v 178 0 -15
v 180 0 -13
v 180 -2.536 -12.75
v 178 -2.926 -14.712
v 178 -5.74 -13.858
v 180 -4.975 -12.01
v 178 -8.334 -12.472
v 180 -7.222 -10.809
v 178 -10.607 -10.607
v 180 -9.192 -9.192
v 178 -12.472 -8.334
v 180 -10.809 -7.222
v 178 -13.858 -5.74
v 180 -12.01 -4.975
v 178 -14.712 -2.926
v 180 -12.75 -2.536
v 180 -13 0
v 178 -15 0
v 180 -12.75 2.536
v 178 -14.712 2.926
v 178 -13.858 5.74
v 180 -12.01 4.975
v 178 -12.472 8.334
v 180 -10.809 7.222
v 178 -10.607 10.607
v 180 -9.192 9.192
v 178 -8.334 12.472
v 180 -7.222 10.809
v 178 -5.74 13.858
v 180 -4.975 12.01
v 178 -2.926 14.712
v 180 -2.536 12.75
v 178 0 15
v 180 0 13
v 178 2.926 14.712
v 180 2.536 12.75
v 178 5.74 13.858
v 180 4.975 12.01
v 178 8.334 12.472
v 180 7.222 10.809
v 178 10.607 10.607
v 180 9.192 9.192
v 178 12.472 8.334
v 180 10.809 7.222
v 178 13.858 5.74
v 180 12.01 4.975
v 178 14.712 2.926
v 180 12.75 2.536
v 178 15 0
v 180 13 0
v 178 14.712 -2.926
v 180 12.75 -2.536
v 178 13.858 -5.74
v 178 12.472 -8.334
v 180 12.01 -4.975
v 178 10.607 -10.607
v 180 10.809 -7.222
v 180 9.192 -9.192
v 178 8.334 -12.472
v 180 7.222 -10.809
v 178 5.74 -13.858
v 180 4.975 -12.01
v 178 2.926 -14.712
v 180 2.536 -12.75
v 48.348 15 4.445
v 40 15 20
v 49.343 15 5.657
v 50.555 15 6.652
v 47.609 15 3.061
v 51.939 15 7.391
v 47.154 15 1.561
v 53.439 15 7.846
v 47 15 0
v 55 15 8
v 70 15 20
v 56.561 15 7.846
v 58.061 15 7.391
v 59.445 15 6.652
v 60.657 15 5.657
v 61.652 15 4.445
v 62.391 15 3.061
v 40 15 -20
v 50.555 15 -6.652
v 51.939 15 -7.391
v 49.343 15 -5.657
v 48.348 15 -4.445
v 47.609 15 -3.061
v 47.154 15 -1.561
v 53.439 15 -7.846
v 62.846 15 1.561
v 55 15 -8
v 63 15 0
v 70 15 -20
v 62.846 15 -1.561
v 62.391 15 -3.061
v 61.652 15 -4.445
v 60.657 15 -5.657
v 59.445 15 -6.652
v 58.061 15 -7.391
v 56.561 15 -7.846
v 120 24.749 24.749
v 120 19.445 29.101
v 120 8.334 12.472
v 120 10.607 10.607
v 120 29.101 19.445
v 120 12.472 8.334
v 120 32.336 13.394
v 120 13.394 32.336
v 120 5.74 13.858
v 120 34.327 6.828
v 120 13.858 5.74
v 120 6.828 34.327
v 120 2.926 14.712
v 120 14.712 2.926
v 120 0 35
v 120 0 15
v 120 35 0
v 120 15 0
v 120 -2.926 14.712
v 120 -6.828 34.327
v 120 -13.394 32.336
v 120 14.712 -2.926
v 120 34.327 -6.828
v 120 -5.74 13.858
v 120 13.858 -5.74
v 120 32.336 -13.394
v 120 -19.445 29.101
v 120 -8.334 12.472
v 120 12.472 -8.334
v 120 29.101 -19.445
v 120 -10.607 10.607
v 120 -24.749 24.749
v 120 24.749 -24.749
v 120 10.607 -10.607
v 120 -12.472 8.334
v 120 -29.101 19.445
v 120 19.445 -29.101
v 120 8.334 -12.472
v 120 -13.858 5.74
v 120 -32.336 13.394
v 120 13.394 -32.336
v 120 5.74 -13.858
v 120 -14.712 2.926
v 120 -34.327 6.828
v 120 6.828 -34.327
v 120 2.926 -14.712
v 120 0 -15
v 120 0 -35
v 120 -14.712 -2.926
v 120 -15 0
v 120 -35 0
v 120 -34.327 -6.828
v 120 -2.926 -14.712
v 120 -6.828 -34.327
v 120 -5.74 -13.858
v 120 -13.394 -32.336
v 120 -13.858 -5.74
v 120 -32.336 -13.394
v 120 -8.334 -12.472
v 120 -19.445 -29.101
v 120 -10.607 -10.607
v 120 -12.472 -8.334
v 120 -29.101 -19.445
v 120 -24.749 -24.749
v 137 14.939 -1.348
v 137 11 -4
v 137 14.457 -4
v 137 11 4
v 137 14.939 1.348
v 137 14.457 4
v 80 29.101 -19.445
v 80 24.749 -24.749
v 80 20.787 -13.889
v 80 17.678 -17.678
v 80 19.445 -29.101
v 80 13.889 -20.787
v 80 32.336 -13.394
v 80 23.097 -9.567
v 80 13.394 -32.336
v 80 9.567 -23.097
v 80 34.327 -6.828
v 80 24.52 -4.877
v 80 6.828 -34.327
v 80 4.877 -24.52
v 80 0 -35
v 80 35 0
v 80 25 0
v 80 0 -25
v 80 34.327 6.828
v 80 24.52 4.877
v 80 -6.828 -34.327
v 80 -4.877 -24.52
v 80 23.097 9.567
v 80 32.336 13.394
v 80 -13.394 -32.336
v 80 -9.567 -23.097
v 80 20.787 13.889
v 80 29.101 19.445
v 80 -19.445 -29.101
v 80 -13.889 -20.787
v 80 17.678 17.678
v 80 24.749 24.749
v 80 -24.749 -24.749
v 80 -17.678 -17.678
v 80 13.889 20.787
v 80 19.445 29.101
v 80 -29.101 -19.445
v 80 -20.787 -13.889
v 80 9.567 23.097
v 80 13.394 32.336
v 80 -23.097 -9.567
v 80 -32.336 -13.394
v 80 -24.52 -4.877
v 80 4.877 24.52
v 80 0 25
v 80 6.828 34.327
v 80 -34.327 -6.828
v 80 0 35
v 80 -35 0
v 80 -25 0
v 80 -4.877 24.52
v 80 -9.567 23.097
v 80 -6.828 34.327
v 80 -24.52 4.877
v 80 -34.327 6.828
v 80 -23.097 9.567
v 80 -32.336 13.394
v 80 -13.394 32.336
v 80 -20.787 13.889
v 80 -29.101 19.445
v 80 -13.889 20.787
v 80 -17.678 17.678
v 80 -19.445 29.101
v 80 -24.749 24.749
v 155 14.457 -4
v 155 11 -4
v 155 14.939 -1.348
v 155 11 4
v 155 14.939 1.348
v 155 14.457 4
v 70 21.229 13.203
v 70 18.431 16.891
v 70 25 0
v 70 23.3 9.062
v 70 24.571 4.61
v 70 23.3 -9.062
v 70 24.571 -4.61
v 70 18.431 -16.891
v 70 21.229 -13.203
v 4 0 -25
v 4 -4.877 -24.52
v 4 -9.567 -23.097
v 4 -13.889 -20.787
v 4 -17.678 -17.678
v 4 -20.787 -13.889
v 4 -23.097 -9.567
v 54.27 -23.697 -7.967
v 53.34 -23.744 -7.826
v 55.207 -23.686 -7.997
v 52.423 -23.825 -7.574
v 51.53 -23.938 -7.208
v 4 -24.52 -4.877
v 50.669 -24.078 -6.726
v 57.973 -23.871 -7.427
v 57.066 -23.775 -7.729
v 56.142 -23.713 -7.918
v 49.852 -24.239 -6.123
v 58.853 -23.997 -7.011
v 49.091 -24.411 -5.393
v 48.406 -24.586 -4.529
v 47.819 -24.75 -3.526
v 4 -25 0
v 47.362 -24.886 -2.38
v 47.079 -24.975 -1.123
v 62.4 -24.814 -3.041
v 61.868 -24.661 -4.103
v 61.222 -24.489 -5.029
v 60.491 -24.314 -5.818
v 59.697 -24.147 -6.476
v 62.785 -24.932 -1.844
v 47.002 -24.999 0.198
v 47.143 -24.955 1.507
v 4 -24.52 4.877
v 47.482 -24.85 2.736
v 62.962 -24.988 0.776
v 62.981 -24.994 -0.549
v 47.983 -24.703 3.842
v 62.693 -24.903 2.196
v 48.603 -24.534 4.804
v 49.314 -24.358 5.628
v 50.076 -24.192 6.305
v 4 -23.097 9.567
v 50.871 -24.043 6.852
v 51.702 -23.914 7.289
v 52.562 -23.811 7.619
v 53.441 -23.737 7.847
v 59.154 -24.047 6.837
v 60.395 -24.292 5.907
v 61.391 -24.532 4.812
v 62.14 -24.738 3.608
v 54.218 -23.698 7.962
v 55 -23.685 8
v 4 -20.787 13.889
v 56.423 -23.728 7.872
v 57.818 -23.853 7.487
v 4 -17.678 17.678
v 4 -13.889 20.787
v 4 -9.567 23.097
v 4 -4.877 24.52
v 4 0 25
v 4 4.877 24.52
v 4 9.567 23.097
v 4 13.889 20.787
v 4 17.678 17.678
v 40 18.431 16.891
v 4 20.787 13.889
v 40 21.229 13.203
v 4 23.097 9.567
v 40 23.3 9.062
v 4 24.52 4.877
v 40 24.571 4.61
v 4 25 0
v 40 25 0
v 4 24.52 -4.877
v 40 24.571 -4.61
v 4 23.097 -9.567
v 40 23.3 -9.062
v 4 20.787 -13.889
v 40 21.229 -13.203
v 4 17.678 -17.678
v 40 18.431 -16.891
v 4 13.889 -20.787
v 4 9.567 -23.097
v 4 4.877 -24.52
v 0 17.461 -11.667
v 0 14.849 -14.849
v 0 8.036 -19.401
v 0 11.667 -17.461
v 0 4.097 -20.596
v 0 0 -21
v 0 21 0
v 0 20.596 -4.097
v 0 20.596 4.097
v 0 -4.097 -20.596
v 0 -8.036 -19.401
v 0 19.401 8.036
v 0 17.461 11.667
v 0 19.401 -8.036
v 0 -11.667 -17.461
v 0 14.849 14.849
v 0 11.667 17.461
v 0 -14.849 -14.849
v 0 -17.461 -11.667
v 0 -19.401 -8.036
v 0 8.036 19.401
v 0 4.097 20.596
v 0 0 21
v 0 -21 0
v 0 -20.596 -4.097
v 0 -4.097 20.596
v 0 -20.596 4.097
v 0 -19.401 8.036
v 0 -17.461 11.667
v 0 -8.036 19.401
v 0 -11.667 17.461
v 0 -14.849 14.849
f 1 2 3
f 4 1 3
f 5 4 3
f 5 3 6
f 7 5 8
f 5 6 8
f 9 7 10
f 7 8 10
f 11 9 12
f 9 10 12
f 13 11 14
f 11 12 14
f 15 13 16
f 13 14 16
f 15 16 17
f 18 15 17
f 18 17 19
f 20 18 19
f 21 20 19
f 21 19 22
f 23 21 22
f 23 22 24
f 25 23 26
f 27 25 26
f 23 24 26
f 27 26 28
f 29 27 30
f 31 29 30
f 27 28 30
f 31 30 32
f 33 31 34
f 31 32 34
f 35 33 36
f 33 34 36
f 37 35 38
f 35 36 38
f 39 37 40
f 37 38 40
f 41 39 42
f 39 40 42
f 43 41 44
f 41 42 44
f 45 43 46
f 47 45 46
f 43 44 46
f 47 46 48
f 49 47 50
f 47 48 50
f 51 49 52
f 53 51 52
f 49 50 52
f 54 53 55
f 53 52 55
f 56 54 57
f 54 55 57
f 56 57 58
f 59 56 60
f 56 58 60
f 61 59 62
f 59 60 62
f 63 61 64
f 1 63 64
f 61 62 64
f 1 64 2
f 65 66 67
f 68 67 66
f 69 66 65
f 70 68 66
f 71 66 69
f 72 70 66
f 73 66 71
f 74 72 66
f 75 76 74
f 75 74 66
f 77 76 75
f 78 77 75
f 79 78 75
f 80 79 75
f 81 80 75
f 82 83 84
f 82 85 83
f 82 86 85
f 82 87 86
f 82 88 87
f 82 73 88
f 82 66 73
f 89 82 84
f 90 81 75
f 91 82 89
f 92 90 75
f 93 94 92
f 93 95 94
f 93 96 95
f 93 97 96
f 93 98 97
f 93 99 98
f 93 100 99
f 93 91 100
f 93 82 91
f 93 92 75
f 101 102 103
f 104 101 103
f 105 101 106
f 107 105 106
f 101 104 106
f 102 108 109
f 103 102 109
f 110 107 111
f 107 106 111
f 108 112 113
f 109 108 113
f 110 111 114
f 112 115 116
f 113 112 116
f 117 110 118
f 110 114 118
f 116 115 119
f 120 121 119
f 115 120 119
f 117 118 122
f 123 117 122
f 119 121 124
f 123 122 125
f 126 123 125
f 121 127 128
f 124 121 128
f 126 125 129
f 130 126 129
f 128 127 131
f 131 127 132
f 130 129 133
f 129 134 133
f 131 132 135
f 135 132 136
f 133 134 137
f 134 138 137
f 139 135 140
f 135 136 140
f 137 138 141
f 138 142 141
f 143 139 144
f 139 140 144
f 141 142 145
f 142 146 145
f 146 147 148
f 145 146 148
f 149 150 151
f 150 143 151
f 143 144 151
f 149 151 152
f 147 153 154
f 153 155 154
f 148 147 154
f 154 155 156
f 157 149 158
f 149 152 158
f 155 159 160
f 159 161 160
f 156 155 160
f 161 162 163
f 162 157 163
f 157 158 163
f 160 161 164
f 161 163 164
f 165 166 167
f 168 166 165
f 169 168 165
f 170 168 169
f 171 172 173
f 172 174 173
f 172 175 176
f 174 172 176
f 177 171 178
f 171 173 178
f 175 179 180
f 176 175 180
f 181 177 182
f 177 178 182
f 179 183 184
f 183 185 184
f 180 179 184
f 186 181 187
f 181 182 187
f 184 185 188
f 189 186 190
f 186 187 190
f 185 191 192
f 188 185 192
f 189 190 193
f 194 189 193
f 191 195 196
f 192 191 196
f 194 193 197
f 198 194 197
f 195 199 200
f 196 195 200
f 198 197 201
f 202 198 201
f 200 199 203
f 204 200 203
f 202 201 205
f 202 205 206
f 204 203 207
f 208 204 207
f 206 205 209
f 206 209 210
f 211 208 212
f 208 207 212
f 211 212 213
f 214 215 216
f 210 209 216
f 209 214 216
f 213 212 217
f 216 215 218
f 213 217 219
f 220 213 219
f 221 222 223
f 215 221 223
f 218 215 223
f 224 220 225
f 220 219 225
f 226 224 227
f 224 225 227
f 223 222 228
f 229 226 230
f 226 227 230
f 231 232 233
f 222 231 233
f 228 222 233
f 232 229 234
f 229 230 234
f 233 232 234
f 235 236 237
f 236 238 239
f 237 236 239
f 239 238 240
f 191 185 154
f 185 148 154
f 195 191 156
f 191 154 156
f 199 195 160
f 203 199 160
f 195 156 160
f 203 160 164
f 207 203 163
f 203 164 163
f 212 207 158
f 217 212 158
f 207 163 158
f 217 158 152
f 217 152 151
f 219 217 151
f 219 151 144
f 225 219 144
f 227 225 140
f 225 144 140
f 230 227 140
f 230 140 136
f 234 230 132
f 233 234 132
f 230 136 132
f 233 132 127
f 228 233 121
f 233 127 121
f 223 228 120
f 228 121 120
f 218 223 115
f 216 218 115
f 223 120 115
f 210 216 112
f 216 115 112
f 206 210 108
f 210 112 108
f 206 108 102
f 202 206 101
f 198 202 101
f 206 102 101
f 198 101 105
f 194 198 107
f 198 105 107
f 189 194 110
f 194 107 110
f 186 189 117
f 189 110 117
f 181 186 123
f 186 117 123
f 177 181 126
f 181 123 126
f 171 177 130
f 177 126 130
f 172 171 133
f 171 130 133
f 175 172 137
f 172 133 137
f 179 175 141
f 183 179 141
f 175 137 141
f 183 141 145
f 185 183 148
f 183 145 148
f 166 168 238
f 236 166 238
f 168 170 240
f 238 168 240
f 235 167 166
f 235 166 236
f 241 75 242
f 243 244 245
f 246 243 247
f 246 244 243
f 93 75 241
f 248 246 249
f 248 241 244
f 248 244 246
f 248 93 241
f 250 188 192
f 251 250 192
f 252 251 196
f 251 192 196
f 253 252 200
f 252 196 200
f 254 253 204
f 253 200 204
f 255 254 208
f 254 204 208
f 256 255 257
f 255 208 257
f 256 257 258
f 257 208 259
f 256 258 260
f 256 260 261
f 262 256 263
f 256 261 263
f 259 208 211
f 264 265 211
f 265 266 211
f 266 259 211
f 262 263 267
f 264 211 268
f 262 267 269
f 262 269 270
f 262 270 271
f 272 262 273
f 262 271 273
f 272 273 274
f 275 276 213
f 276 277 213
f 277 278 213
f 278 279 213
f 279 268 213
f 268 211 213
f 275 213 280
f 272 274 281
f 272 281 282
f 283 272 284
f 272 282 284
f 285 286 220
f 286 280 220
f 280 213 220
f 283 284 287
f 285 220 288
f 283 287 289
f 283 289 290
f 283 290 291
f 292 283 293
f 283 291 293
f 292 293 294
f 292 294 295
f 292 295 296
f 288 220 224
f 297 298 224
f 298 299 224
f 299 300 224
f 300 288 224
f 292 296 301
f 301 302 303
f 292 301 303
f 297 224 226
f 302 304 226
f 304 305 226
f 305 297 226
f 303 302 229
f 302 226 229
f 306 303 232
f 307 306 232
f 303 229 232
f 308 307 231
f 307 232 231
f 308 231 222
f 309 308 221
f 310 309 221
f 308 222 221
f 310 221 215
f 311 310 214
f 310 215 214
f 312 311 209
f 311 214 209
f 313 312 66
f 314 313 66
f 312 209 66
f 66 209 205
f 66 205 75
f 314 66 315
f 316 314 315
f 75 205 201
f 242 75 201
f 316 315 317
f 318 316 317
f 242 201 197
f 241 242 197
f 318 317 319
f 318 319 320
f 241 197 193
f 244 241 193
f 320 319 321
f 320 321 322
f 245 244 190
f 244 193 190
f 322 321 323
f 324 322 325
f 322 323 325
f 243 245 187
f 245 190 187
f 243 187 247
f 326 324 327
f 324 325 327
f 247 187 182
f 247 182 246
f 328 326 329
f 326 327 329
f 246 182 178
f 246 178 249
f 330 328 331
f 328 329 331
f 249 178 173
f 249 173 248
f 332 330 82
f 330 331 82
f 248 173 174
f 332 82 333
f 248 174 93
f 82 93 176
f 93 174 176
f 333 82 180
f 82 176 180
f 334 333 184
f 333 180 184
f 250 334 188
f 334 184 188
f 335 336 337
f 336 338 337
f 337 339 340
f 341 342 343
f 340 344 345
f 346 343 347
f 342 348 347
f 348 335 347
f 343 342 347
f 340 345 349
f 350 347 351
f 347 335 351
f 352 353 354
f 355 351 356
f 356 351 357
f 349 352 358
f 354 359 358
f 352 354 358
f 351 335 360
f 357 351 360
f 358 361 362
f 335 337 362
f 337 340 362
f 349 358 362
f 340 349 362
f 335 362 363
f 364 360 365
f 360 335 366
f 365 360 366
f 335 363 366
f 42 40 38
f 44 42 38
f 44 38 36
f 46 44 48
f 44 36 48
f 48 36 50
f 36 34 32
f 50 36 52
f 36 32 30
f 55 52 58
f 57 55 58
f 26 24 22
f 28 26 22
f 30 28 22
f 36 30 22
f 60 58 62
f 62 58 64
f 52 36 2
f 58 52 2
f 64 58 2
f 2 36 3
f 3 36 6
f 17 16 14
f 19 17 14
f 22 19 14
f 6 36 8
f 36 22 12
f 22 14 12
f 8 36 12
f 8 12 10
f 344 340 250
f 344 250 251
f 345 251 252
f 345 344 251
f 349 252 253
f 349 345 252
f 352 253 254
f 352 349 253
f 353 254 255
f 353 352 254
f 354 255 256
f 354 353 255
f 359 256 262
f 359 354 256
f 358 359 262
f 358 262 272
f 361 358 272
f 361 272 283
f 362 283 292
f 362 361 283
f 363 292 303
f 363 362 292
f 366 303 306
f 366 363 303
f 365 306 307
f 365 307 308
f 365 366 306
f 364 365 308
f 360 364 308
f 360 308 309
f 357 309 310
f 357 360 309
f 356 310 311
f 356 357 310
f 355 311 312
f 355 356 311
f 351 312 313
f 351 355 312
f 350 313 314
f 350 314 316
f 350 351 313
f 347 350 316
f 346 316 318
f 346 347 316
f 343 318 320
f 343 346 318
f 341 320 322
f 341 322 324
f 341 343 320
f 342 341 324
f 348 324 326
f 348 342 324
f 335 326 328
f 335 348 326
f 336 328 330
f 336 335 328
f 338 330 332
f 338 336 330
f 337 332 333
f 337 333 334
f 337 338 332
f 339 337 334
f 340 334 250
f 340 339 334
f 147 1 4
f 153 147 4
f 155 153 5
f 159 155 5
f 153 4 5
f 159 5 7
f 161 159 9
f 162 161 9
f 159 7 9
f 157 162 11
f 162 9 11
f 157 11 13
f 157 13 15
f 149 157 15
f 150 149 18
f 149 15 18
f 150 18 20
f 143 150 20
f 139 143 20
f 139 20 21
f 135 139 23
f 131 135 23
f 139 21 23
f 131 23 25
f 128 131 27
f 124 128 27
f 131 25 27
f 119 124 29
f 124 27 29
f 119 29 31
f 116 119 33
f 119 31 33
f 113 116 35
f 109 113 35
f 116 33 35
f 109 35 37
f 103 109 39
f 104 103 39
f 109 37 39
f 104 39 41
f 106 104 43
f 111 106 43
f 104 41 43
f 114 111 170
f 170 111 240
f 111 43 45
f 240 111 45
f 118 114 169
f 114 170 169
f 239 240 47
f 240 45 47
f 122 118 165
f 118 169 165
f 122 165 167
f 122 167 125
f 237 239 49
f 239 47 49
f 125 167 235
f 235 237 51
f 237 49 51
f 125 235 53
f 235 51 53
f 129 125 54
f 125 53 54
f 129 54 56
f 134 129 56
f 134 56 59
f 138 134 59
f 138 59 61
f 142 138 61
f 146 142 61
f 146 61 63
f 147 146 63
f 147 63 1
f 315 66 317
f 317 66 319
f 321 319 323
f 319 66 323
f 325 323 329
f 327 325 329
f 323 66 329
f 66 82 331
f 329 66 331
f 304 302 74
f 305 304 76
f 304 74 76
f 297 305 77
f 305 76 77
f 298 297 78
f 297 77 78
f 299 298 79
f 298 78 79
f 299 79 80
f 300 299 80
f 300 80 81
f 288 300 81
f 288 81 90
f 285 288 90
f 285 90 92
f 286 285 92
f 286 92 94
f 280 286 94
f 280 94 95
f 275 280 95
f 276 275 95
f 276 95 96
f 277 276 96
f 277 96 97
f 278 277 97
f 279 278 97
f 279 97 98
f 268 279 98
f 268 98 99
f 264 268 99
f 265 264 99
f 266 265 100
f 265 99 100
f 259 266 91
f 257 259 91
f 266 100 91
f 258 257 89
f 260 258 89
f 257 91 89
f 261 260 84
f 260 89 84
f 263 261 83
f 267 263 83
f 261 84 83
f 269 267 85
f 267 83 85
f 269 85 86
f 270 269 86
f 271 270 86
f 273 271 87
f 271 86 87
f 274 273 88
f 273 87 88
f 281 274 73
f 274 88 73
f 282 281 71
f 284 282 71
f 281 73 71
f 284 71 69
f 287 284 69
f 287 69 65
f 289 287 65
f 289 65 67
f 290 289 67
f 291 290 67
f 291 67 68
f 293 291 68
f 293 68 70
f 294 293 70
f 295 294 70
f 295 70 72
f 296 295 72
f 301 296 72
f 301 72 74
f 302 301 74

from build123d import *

# Parameters (mm, degrees)
CUT_EXTRUDE_7_DEPTH      = 187.681547026
CUT_EXTRUDE_7_DEPTH_BACK = 187.681547026
SKETCH_10_W              = 30
SKETCH_10_H              = 10
SKETCH_14_R              = 8
CUT_EXTRUDE_8_DEPTH      = 191.065778087
SKETCH_6_W               = 18
SKETCH_6_H               = 4
CUT_EXTRUDE_4_DEPTH      = 4
CHAMFER_3_SIZE           = 2
CHAMFER_4_SIZE           = 4


with BuildPart() as part:
    # Эскиз1 → Повернуть1 (revolve)
    with BuildSketch(Plane.XY, mode=Mode.PRIVATE) as revolve_1_sk:
        Polygon((0, 0), (0, 25), (80, 25), (80, 35), (120, 35), (120, 15), (180, 15), (180, 0), align=None)
    revolve(revolve_1_sk.sketch.rotate(Axis((0, 0, 0), (-1, 0, 0)), 90), axis=Axis((0, 0, 0), (-1, 0, 0)))

    # Эскиз10 → Вырез-Вытянуть7 (cut, two sides: drawn at the far end of the back side and taken through both)
    with BuildSketch(Plane.XY.offset(-CUT_EXTRUDE_7_DEPTH_BACK)):
        with Locations((55, 20)):
            Rectangle(SKETCH_10_W, SKETCH_10_H)
    extrude(amount=CUT_EXTRUDE_7_DEPTH + CUT_EXTRUDE_7_DEPTH_BACK, mode=Mode.SUBTRACT)

    # Эскиз14 → Вырез-Вытянуть8 (cut, through all)
    with BuildSketch(Plane(origin=(0, 15, 0), x_dir=(1, 0, 0), z_dir=(0, 1, 0))):
        with Locations(Location((55, 0, 0), (0, 0, 270))):
            Circle(SKETCH_14_R)
    extrude(amount=-CUT_EXTRUDE_8_DEPTH, mode=Mode.SUBTRACT)

    # Эскиз6 → Вырез-Вытянуть4 (cut, symmetric)
    with BuildSketch(Plane.XY):
        with Locations((146, 13)):
            Rectangle(SKETCH_6_W, SKETCH_6_H)
    extrude(amount=CUT_EXTRUDE_4_DEPTH, both=True, mode=Mode.SUBTRACT)

    # Фаска3
    chamfer_3_edges = [part.edges().sort_by_distance(p)[0] for p in [
        (180, 0, 15),
    ]]
    chamfer(chamfer_3_edges, length=CHAMFER_3_SIZE)

    # Фаска4
    chamfer_4_edges = [part.edges().sort_by_distance(p)[0] for p in [
        (0, 0, 25),
    ]]
    chamfer(chamfer_4_edges, length=CHAMFER_4_SIZE)


solid = part.part
